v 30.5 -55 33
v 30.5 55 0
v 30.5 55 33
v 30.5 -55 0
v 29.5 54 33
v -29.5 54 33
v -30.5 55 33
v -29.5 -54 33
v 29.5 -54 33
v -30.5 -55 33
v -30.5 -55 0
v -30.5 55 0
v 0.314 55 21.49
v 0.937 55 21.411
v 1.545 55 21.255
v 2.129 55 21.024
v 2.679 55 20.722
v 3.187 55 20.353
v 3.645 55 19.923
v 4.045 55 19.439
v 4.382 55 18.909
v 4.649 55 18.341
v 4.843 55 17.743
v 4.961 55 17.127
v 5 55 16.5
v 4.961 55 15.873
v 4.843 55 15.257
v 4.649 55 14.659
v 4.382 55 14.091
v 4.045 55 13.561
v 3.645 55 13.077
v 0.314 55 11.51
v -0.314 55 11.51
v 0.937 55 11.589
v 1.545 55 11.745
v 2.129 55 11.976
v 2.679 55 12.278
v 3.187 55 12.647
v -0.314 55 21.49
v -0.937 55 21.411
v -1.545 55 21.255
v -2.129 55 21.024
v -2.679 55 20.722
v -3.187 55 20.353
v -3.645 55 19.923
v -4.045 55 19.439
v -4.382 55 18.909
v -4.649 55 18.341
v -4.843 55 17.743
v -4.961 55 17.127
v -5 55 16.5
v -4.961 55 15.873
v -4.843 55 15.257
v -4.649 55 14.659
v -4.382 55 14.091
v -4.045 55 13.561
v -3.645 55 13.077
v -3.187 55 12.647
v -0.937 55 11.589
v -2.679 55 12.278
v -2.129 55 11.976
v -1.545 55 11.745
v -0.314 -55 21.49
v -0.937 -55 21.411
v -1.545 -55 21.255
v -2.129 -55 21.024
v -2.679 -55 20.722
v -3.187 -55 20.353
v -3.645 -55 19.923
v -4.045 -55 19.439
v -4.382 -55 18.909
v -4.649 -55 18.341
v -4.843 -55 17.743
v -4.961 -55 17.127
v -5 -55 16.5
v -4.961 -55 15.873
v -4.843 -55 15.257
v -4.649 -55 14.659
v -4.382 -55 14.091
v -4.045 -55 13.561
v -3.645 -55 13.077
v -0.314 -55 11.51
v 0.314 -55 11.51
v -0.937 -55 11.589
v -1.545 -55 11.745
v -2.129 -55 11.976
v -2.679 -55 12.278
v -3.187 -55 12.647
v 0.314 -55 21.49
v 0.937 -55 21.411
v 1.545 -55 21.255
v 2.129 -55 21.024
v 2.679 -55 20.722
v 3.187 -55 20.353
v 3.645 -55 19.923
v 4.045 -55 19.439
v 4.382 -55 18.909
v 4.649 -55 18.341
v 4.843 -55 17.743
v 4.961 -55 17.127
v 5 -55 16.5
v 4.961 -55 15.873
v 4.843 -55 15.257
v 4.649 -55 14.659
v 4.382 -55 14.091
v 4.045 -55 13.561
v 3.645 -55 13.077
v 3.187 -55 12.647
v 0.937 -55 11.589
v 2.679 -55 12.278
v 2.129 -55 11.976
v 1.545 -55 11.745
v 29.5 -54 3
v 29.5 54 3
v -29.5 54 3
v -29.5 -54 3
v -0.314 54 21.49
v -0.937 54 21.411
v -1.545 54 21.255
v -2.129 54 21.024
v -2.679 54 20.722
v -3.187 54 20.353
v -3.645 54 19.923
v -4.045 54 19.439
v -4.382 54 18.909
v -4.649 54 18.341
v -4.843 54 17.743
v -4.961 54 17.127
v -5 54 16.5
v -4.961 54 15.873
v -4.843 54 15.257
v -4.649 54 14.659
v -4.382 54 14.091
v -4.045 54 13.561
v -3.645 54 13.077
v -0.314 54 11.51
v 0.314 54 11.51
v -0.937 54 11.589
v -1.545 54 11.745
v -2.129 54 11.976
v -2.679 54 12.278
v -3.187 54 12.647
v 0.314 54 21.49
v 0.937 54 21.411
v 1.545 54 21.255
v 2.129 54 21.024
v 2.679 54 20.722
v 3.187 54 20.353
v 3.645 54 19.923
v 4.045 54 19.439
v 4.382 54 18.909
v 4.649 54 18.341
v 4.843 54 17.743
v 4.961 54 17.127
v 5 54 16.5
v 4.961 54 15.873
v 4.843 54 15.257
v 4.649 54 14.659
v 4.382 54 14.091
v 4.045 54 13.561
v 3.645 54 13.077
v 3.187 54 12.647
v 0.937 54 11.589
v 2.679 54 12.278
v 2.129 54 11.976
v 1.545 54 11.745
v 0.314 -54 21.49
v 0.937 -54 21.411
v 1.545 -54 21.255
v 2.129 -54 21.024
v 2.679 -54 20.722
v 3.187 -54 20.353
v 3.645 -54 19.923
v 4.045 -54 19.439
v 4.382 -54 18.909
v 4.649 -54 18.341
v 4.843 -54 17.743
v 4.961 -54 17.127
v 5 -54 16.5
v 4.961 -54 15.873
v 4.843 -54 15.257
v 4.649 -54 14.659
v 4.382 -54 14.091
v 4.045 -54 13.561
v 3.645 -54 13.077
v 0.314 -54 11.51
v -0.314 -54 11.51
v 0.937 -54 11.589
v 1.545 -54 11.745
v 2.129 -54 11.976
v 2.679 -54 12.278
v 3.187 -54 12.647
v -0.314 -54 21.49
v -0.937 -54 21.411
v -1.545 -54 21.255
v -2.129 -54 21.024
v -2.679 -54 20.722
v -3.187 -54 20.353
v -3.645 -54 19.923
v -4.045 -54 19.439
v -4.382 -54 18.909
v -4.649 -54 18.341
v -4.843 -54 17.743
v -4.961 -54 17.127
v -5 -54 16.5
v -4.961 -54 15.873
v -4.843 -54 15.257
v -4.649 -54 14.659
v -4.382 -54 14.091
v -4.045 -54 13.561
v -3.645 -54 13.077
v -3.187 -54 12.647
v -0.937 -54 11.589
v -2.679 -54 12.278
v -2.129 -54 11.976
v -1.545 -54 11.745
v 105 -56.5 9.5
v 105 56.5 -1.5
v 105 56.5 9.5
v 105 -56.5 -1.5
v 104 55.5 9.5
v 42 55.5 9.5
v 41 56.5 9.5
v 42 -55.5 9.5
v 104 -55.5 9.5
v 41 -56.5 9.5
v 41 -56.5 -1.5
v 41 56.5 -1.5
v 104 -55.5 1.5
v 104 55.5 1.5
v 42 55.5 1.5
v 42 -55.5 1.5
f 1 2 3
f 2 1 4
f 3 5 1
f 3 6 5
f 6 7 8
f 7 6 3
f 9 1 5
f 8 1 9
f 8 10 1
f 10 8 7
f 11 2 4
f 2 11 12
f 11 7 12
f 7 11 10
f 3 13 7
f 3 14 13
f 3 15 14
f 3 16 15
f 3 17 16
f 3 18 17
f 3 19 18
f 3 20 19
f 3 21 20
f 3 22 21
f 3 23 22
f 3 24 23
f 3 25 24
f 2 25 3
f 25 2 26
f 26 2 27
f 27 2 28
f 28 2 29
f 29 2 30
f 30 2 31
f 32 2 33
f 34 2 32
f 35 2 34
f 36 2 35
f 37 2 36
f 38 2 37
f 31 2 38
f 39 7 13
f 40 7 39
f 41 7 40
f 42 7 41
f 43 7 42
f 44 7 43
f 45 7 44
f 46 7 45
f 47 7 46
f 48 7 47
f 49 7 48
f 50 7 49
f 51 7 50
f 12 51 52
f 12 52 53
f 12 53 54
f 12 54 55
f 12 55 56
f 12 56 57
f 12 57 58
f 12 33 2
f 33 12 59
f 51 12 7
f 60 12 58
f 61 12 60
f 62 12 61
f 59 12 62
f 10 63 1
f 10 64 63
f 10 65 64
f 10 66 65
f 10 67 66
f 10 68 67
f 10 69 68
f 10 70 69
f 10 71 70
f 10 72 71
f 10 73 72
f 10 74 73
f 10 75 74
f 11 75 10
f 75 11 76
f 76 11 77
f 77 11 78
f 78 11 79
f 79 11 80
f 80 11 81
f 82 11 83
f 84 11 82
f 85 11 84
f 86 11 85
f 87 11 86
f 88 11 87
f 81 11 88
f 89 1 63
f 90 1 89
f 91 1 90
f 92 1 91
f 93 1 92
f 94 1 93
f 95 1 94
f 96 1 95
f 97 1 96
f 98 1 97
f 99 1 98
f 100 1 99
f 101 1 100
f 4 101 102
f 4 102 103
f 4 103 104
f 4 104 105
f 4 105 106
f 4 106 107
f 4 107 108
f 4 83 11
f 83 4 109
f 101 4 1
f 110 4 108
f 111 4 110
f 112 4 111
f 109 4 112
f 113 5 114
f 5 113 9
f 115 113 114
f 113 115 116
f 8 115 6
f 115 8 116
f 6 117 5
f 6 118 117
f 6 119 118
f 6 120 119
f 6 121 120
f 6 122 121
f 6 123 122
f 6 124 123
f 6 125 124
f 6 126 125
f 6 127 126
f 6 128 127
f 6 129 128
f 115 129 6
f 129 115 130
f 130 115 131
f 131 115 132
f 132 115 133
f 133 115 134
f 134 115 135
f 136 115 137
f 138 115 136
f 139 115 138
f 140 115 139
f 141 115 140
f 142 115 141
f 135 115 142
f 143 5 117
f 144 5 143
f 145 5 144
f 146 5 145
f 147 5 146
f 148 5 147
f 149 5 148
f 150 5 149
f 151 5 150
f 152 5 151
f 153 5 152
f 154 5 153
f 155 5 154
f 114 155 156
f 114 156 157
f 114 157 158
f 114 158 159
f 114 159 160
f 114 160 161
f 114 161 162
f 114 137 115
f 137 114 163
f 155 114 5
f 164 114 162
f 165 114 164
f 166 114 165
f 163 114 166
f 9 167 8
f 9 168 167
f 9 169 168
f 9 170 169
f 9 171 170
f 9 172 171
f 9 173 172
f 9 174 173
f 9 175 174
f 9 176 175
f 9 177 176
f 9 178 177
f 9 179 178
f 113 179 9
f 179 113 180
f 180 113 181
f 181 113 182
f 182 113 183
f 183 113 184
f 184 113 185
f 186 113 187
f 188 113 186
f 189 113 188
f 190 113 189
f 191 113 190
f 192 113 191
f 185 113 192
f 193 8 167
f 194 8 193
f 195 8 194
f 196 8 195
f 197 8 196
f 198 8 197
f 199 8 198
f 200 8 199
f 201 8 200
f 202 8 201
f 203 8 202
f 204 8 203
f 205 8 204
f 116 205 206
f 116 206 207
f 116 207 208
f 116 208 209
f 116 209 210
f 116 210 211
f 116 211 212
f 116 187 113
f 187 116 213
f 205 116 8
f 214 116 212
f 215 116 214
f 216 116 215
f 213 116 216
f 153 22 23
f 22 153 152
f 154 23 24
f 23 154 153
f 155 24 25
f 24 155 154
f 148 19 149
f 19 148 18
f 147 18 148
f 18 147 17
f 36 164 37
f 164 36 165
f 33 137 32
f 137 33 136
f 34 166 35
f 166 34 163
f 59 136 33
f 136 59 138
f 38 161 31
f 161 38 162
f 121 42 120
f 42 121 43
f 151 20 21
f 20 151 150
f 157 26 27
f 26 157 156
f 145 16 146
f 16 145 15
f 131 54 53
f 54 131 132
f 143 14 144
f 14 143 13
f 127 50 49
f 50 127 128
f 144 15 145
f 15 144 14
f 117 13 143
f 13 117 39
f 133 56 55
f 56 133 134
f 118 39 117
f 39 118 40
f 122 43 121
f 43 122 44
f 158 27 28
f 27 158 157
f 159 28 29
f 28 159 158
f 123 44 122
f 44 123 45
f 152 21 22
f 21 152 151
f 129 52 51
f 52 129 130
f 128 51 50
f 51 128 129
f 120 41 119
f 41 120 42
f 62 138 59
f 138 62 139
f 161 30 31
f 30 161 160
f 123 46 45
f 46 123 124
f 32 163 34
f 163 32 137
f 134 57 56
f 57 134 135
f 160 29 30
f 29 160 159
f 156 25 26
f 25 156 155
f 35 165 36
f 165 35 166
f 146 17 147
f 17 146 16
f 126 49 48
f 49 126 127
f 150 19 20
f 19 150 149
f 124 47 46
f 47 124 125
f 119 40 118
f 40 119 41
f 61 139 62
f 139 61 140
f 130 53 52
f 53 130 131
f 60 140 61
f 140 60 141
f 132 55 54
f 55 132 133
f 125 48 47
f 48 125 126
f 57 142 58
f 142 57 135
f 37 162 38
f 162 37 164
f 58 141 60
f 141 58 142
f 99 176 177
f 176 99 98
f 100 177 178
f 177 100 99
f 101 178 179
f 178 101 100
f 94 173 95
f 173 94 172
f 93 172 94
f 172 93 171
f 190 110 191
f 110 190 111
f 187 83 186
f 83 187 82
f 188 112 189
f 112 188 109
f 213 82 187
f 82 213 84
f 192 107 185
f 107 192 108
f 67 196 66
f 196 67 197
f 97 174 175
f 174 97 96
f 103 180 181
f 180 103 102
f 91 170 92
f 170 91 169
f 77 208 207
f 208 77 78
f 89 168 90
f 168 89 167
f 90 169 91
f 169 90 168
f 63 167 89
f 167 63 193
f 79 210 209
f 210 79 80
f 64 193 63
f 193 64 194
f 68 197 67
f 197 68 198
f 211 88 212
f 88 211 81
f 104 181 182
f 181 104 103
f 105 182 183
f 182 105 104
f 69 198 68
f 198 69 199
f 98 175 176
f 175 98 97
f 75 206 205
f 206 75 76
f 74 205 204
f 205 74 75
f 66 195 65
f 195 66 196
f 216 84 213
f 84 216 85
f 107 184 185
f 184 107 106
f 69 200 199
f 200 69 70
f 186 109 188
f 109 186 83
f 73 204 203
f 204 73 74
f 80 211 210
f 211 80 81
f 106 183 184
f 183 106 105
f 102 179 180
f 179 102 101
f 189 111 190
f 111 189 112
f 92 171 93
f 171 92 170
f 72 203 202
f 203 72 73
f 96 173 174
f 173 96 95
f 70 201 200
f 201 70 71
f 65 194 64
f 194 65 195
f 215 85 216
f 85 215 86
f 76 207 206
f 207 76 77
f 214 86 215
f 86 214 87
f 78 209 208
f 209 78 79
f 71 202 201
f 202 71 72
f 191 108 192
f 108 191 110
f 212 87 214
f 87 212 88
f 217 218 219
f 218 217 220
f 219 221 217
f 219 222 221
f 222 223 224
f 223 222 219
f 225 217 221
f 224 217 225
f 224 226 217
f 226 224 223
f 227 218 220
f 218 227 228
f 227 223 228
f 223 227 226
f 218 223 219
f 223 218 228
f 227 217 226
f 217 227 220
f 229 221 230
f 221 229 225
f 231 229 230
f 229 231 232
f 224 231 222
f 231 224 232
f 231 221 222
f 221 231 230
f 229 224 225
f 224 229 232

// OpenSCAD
/*
*  Created by: Anhtien Nguyen
*  Date:  June 9, 2018
   Description: Design the box and cover for electronic board
 *  120/220 VAC to 24VDC power supply, model DC2412
*/


// Choose, which part you want to see!
part = "all_parts__";  //[all_parts__:All Parts,bottom_part__:Bottom,top_part__:Top]


// Dimensions for DC2412 is 58 x 107 x 30
width=58.0;//[29:87]
length = 107;//[53:160]
height=30; //[13:40]
lid_height = 5;//[5:10]

// Adjust for clearance, thickness, and wire holes
gap = 1;
thickness = 2;
hole_radius = 5;

// Program Section //
if(part == "bottom_part__") {
    box();
} else if(part == "top_part__") {
    box(width = width + gap*2 + thickness, length = length + gap*2+ thickness, height = lid_height + gap*2+ thickness,lid=true);
} else if(part == "all_parts__") {
    all_parts();
} else {
    all_parts();
}

module all_parts() {
// call the function for the bottom part
//
translate([0,0,(height+gap+thickness)/2]) box();
//
// call the function for the top part
//
translate([width+gap+(thickness*2)+10,0,(lid_height+gap+thickness)/2]) box(width = width + gap*2+ thickness, length = length + gap*2+ thickness, height = lid_height + gap*2+ thickness ,lid=true);
}
/*
 * Function box()
 * Draw the box without the top
 */
module box(width = width+gap, length = length+gap , height = height +gap, lid=false) {
    ow_width = width + thickness;
    ow_length= length + thickness;
    ow_height= height  + thickness;

//    rotate([0,0,45]) translate([-ow_width/2,-ow_length/2,0]) cube([10,10,ow_height+thickness*2],center=true);
    difference() {
        // define the box without the top
        union() 
        difference() {
                // outside wall
                intersection() {
                    cube([ow_width, ow_length, ow_height],center=true);
                }
                // inside wall
                 translate([0,0,thickness]) intersection() {
                   cube([width, length, height],center=true);
                 }
        } 
        
        // if it's the bottom part, punch two holes for the wires
        if(!lid) {
            rotate([90,0,0]) translate([0,0,-length/2]) cylinder(r=hole_radius,h=thickness*2,$fn=50,center=true);
            rotate([90,0,0]) translate([0,0, length/2]) cylinder(r=hole_radius,h=thickness*2,$fn=50,center=true);
        }
    }
}
